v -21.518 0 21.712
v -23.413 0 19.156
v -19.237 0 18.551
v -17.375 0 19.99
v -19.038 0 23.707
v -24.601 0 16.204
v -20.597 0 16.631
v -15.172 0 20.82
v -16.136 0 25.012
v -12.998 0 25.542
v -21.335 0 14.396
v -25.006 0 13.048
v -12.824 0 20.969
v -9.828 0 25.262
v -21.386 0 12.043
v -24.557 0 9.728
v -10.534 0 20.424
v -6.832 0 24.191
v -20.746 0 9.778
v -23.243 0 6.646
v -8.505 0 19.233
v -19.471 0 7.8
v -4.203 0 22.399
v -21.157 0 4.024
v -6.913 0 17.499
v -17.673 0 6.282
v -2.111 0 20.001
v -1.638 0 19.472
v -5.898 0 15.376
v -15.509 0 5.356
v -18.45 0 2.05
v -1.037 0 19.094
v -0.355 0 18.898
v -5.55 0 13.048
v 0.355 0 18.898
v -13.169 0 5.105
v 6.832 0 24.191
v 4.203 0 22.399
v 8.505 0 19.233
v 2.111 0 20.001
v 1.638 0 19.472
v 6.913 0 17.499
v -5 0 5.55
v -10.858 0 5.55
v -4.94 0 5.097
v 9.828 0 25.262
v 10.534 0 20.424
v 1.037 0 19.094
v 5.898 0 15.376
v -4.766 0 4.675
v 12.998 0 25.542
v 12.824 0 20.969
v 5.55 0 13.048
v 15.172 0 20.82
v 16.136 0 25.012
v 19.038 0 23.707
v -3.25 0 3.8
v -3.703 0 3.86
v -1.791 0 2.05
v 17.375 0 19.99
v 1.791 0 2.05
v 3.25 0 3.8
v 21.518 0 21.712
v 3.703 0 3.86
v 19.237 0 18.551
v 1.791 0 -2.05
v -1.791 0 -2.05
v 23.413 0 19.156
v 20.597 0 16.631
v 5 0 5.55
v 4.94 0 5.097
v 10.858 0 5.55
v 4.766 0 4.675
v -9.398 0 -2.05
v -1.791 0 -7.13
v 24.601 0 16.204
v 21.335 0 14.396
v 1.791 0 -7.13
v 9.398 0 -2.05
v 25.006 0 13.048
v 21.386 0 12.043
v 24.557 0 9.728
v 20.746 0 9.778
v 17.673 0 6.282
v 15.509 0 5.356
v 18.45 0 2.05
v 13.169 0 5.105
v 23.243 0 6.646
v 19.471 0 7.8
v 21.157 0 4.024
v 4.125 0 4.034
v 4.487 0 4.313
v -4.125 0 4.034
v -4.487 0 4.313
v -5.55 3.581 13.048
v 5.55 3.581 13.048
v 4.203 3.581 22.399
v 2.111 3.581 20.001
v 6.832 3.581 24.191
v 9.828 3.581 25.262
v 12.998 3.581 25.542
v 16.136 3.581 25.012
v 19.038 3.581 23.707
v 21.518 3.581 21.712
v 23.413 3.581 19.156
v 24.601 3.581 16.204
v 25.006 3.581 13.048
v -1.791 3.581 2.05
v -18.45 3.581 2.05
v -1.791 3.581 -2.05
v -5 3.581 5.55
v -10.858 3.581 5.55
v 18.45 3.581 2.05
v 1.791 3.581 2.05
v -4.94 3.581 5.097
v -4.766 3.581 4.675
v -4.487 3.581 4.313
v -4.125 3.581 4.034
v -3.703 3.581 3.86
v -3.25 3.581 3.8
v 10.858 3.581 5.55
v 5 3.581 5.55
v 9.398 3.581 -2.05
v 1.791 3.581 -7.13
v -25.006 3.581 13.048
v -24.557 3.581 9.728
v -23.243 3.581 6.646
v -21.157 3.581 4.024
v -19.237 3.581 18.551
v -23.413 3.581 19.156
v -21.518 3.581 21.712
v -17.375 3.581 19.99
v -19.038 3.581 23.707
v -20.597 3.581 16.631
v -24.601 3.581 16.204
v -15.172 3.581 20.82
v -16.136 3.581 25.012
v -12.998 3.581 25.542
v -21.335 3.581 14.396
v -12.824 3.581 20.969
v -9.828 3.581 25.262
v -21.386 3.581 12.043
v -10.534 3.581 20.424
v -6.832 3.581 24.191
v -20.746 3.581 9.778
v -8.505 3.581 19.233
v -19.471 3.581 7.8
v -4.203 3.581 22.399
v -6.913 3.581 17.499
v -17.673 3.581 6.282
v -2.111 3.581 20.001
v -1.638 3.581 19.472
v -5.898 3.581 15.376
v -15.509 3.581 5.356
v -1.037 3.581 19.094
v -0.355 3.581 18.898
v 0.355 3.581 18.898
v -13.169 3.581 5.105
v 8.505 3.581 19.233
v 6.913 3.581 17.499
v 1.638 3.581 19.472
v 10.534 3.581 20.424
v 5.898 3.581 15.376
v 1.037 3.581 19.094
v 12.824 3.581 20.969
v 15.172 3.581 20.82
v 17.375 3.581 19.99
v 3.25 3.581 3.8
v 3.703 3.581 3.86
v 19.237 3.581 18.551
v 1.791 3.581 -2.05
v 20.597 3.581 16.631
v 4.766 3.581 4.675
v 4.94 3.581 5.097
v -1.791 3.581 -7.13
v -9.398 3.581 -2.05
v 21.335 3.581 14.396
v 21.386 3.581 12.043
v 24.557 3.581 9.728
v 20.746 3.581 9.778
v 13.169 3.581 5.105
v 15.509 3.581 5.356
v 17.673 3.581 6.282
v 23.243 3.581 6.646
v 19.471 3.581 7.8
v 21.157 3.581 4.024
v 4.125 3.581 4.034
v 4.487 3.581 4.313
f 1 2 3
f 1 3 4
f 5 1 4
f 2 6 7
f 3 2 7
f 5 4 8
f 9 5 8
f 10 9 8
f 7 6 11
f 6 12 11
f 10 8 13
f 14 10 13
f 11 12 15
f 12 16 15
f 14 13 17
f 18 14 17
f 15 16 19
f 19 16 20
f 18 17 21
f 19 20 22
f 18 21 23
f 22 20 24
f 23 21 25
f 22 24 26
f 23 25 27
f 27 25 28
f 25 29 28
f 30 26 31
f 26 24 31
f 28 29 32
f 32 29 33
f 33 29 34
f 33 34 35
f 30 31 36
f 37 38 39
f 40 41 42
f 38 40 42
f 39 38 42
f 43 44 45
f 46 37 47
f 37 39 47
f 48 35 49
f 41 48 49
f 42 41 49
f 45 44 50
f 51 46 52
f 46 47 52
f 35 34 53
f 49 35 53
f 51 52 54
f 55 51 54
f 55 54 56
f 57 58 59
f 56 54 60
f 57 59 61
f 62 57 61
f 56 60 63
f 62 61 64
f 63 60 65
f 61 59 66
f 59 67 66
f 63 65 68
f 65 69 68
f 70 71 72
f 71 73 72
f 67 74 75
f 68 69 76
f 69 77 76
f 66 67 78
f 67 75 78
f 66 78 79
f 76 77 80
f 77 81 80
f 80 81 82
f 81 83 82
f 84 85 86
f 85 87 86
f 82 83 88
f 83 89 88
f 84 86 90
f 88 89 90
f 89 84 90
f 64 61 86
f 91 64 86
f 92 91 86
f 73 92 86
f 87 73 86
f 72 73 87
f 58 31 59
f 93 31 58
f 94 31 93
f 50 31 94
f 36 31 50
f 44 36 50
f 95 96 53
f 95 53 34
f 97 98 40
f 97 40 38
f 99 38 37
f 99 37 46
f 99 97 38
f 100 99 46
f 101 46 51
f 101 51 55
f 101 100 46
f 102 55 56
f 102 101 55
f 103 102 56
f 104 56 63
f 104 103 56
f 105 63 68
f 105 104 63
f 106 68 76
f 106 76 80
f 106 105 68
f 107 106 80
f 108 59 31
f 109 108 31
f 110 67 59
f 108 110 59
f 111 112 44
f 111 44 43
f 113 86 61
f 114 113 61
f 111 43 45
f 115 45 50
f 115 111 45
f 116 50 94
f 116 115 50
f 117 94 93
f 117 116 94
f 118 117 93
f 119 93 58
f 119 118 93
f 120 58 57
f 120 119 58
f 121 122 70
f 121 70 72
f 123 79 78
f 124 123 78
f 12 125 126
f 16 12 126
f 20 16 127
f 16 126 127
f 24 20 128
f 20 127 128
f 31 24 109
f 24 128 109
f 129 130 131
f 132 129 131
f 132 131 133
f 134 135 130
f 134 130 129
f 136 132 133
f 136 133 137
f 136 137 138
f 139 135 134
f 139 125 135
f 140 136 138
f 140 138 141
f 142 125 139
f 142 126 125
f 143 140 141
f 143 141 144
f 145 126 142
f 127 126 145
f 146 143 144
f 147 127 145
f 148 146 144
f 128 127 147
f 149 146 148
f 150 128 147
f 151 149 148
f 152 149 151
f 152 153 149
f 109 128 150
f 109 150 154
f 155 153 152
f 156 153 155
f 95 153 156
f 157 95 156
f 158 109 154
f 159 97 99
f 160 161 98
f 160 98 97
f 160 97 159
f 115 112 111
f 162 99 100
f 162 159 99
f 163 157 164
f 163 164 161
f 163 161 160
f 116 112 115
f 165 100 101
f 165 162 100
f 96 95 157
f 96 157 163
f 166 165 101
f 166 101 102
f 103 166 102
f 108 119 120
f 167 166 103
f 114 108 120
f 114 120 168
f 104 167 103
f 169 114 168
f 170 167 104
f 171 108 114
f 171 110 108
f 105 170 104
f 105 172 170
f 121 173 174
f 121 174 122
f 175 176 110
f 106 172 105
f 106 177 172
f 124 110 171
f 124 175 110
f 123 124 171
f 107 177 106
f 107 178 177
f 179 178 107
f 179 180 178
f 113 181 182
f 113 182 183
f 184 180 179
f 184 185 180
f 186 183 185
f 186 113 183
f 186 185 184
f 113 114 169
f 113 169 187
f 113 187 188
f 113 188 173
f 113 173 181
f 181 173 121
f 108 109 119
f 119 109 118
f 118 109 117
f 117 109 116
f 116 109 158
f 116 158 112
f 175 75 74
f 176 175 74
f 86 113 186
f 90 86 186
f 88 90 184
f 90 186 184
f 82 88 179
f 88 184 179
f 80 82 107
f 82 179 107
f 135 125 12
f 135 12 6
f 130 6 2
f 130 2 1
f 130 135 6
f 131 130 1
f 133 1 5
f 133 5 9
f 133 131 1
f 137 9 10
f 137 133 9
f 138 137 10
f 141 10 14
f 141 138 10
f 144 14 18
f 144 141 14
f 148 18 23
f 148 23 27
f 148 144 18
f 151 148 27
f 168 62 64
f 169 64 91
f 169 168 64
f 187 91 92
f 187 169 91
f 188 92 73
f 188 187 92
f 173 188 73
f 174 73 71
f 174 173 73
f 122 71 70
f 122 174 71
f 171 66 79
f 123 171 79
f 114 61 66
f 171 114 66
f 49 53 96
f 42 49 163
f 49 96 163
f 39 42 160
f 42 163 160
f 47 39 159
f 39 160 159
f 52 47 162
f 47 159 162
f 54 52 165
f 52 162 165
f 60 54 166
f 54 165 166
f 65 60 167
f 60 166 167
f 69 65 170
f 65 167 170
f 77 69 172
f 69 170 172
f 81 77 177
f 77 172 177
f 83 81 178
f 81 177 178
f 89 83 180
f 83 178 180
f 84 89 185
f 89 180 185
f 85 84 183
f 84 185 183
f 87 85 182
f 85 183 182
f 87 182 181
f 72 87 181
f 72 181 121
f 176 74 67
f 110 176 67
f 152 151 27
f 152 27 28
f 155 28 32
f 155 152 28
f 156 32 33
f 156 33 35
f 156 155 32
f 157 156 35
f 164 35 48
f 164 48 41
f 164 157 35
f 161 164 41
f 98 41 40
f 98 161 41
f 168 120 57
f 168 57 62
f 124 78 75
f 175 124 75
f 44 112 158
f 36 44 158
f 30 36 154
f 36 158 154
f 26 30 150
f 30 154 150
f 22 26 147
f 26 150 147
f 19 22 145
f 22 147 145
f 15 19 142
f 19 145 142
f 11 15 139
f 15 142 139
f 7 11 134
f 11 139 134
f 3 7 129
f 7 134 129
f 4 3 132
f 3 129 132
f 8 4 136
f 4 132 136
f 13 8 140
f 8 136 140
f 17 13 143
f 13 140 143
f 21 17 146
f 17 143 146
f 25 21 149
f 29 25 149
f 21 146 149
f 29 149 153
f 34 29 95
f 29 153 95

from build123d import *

# Parameters (mm, degrees)
BOSS_EXTRUDE1_DEPTH = 3.5814
BOSS_EXTRUDE2_DEPTH = 3.5814
SKETCH4_R           = 7.95
CUT_EXTRUDE2_DEPTH  = 4.5814
CUT_EXTRUDE4_REACH  = 5.581
CUT_EXTRUDE5_REACH  = 5.581


with BuildPart() as part:
    # Sketch1 → Boss-Extrude1 (new body)
    with BuildSketch(Plane(origin=(0, 0, 0), x_dir=(1, 0, 0), z_dir=(0, 1, 0))):
        Polygon((-25.0063, -13.0482), (25.0063, -13.0482), (25.0063, -2.05), (1.7907, -2.05), (1.7907, 2.05), (9.398, 2.05), (1.7907, 7.13), (-1.7907, 7.13), (-9.398, 2.05), (-1.7907, 2.05), (-1.7907, -2.05), (-25.0063, -2.05), align=None)
    extrude(amount=BOSS_EXTRUDE1_DEPTH)

    # Sketch3 → Boss-Extrude2 (add)
    with BuildSketch(Plane(origin=(0, 3.5814, 0), x_dir=(1, 0, 0), z_dir=(0, 1, 0))):
        Polygon((-25.0063, -2.05), (-25.0063, -13.0482), (25.0063, -13.0482), (25.0063, -2.05), (1.7907, -2.05), (1.7907, 2.05), (9.398, 2.05), (1.7907, 7.13), (-1.7907, 7.13), (-9.398, 2.05), (-1.7907, 2.05), (-1.7907, -2.05), align=None)
        with BuildLine():
            Line((25.0063, -13.0482), (-25.0063, -13.0482))
            ThreePointArc((-25.0063, -13.0482), (-16.136037163, -25.01193231), (-2.111127058, -20.000510342))
            ThreePointArc((-2.111127058, -20.000510342), (0, -18.87286389), (2.111127058, -20.000510342))
            ThreePointArc((2.111127058, -20.000510342), (16.136037163, -25.01193231), (25.0063, -13.0482))
        make_face()
    extrude(amount=-BOSS_EXTRUDE2_DEPTH)

    # Sketch4 → Cut-Extrude2 (cut, through all)
    with BuildSketch(Plane(origin=(0, 3.5814, 0), x_dir=(1, 0, 0), z_dir=(0, 1, 0))):
        with Locations((-13.5, -13.0482)):
            Circle(SKETCH4_R)
        with Locations((13.5, -13.0482)):
            Circle(SKETCH4_R)
    extrude(amount=-CUT_EXTRUDE2_DEPTH, mode=Mode.SUBTRACT)

    # Sketch5 → Cut-Extrude4 (cut, up to next)
    with BuildSketch(Plane(origin=(0, 3.5814, 0), x_dir=(1, 0, 0), z_dir=(0, 1, 0)), mode=Mode.PRIVATE) as cut_extrude4_sk1:
        with BuildLine():
            Line((-3.25, -3.8), (3.25, -3.8))
            ThreePointArc((3.25, -3.8), (4.487436867, -4.312563133), (5, -5.55))
            Line((5, -5.55), (10.858126279, -5.55))
            ThreePointArc((10.858126279, -5.55), (7.011340813, -8.454747926), (5.55, -13.0482))
            Line((5.55, -13.0482), (-5.55, -13.0482))
            ThreePointArc((-5.55, -13.0482), (-7.011340813, -8.454747926), (-10.858126279, -5.55))
            Line((-10.858126279, -5.55), (-5, -5.55))
            ThreePointArc((-5, -5.55), (-4.487436867, -4.312563133), (-3.25, -3.8))
        make_face()
    cut_extrude4_tool1 = extrude(cut_extrude4_sk1.sketch, amount=-CUT_EXTRUDE4_REACH, mode=Mode.PRIVATE) & part.part
    add(cut_extrude4_tool1.solids().sort_by_distance((0, 3.5814, 8.325803))[0], mode=Mode.SUBTRACT)

    # Sketch6 → Cut-Extrude5 (cut, up to next)
    with BuildSketch(Plane(origin=(0, 3.5814, 0), x_dir=(1, 0, 0), z_dir=(0, 1, 0)), mode=Mode.PRIVATE) as cut_extrude5_sk1:
        with BuildLine():
            Line((-18.450280122, -2.05), (-25.0063, -2.05))
            Line((-25.0063, -2.05), (-25.0063, -13.0482))
            ThreePointArc((-25.0063, -13.0482), (-23.242950275, -6.64621203), (-18.450280122, -2.05))
        make_face()
    cut_extrude5_tool1 = extrude(cut_extrude5_sk1.sketch, amount=-CUT_EXTRUDE5_REACH, mode=Mode.PRIVATE) & part.part
    add(cut_extrude5_tool1.solids().sort_by_distance((-23.17616, 3.5814, 4.635288))[0], mode=Mode.SUBTRACT)
    # Sketch6 → Cut-Extrude5 (cut, up to next)
    with BuildSketch(Plane(origin=(0, 3.5814, 0), x_dir=(1, 0, 0), z_dir=(0, 1, 0)), mode=Mode.PRIVATE) as cut_extrude5_sk2:
        with BuildLine():
            Line((25.0063, -13.0482), (25.0063, -2.05))
            Line((25.0063, -2.05), (18.450280122, -2.05))
            ThreePointArc((18.450280122, -2.05), (23.242950275, -6.64621203), (25.0063, -13.0482))
        make_face()
    cut_extrude5_tool2 = extrude(cut_extrude5_sk2.sketch, amount=-CUT_EXTRUDE5_REACH, mode=Mode.PRIVATE) & part.part
    add(cut_extrude5_tool2.solids().sort_by_distance((23.17616, 3.5814, 4.635288))[0], mode=Mode.SUBTRACT)


solid = part.part
